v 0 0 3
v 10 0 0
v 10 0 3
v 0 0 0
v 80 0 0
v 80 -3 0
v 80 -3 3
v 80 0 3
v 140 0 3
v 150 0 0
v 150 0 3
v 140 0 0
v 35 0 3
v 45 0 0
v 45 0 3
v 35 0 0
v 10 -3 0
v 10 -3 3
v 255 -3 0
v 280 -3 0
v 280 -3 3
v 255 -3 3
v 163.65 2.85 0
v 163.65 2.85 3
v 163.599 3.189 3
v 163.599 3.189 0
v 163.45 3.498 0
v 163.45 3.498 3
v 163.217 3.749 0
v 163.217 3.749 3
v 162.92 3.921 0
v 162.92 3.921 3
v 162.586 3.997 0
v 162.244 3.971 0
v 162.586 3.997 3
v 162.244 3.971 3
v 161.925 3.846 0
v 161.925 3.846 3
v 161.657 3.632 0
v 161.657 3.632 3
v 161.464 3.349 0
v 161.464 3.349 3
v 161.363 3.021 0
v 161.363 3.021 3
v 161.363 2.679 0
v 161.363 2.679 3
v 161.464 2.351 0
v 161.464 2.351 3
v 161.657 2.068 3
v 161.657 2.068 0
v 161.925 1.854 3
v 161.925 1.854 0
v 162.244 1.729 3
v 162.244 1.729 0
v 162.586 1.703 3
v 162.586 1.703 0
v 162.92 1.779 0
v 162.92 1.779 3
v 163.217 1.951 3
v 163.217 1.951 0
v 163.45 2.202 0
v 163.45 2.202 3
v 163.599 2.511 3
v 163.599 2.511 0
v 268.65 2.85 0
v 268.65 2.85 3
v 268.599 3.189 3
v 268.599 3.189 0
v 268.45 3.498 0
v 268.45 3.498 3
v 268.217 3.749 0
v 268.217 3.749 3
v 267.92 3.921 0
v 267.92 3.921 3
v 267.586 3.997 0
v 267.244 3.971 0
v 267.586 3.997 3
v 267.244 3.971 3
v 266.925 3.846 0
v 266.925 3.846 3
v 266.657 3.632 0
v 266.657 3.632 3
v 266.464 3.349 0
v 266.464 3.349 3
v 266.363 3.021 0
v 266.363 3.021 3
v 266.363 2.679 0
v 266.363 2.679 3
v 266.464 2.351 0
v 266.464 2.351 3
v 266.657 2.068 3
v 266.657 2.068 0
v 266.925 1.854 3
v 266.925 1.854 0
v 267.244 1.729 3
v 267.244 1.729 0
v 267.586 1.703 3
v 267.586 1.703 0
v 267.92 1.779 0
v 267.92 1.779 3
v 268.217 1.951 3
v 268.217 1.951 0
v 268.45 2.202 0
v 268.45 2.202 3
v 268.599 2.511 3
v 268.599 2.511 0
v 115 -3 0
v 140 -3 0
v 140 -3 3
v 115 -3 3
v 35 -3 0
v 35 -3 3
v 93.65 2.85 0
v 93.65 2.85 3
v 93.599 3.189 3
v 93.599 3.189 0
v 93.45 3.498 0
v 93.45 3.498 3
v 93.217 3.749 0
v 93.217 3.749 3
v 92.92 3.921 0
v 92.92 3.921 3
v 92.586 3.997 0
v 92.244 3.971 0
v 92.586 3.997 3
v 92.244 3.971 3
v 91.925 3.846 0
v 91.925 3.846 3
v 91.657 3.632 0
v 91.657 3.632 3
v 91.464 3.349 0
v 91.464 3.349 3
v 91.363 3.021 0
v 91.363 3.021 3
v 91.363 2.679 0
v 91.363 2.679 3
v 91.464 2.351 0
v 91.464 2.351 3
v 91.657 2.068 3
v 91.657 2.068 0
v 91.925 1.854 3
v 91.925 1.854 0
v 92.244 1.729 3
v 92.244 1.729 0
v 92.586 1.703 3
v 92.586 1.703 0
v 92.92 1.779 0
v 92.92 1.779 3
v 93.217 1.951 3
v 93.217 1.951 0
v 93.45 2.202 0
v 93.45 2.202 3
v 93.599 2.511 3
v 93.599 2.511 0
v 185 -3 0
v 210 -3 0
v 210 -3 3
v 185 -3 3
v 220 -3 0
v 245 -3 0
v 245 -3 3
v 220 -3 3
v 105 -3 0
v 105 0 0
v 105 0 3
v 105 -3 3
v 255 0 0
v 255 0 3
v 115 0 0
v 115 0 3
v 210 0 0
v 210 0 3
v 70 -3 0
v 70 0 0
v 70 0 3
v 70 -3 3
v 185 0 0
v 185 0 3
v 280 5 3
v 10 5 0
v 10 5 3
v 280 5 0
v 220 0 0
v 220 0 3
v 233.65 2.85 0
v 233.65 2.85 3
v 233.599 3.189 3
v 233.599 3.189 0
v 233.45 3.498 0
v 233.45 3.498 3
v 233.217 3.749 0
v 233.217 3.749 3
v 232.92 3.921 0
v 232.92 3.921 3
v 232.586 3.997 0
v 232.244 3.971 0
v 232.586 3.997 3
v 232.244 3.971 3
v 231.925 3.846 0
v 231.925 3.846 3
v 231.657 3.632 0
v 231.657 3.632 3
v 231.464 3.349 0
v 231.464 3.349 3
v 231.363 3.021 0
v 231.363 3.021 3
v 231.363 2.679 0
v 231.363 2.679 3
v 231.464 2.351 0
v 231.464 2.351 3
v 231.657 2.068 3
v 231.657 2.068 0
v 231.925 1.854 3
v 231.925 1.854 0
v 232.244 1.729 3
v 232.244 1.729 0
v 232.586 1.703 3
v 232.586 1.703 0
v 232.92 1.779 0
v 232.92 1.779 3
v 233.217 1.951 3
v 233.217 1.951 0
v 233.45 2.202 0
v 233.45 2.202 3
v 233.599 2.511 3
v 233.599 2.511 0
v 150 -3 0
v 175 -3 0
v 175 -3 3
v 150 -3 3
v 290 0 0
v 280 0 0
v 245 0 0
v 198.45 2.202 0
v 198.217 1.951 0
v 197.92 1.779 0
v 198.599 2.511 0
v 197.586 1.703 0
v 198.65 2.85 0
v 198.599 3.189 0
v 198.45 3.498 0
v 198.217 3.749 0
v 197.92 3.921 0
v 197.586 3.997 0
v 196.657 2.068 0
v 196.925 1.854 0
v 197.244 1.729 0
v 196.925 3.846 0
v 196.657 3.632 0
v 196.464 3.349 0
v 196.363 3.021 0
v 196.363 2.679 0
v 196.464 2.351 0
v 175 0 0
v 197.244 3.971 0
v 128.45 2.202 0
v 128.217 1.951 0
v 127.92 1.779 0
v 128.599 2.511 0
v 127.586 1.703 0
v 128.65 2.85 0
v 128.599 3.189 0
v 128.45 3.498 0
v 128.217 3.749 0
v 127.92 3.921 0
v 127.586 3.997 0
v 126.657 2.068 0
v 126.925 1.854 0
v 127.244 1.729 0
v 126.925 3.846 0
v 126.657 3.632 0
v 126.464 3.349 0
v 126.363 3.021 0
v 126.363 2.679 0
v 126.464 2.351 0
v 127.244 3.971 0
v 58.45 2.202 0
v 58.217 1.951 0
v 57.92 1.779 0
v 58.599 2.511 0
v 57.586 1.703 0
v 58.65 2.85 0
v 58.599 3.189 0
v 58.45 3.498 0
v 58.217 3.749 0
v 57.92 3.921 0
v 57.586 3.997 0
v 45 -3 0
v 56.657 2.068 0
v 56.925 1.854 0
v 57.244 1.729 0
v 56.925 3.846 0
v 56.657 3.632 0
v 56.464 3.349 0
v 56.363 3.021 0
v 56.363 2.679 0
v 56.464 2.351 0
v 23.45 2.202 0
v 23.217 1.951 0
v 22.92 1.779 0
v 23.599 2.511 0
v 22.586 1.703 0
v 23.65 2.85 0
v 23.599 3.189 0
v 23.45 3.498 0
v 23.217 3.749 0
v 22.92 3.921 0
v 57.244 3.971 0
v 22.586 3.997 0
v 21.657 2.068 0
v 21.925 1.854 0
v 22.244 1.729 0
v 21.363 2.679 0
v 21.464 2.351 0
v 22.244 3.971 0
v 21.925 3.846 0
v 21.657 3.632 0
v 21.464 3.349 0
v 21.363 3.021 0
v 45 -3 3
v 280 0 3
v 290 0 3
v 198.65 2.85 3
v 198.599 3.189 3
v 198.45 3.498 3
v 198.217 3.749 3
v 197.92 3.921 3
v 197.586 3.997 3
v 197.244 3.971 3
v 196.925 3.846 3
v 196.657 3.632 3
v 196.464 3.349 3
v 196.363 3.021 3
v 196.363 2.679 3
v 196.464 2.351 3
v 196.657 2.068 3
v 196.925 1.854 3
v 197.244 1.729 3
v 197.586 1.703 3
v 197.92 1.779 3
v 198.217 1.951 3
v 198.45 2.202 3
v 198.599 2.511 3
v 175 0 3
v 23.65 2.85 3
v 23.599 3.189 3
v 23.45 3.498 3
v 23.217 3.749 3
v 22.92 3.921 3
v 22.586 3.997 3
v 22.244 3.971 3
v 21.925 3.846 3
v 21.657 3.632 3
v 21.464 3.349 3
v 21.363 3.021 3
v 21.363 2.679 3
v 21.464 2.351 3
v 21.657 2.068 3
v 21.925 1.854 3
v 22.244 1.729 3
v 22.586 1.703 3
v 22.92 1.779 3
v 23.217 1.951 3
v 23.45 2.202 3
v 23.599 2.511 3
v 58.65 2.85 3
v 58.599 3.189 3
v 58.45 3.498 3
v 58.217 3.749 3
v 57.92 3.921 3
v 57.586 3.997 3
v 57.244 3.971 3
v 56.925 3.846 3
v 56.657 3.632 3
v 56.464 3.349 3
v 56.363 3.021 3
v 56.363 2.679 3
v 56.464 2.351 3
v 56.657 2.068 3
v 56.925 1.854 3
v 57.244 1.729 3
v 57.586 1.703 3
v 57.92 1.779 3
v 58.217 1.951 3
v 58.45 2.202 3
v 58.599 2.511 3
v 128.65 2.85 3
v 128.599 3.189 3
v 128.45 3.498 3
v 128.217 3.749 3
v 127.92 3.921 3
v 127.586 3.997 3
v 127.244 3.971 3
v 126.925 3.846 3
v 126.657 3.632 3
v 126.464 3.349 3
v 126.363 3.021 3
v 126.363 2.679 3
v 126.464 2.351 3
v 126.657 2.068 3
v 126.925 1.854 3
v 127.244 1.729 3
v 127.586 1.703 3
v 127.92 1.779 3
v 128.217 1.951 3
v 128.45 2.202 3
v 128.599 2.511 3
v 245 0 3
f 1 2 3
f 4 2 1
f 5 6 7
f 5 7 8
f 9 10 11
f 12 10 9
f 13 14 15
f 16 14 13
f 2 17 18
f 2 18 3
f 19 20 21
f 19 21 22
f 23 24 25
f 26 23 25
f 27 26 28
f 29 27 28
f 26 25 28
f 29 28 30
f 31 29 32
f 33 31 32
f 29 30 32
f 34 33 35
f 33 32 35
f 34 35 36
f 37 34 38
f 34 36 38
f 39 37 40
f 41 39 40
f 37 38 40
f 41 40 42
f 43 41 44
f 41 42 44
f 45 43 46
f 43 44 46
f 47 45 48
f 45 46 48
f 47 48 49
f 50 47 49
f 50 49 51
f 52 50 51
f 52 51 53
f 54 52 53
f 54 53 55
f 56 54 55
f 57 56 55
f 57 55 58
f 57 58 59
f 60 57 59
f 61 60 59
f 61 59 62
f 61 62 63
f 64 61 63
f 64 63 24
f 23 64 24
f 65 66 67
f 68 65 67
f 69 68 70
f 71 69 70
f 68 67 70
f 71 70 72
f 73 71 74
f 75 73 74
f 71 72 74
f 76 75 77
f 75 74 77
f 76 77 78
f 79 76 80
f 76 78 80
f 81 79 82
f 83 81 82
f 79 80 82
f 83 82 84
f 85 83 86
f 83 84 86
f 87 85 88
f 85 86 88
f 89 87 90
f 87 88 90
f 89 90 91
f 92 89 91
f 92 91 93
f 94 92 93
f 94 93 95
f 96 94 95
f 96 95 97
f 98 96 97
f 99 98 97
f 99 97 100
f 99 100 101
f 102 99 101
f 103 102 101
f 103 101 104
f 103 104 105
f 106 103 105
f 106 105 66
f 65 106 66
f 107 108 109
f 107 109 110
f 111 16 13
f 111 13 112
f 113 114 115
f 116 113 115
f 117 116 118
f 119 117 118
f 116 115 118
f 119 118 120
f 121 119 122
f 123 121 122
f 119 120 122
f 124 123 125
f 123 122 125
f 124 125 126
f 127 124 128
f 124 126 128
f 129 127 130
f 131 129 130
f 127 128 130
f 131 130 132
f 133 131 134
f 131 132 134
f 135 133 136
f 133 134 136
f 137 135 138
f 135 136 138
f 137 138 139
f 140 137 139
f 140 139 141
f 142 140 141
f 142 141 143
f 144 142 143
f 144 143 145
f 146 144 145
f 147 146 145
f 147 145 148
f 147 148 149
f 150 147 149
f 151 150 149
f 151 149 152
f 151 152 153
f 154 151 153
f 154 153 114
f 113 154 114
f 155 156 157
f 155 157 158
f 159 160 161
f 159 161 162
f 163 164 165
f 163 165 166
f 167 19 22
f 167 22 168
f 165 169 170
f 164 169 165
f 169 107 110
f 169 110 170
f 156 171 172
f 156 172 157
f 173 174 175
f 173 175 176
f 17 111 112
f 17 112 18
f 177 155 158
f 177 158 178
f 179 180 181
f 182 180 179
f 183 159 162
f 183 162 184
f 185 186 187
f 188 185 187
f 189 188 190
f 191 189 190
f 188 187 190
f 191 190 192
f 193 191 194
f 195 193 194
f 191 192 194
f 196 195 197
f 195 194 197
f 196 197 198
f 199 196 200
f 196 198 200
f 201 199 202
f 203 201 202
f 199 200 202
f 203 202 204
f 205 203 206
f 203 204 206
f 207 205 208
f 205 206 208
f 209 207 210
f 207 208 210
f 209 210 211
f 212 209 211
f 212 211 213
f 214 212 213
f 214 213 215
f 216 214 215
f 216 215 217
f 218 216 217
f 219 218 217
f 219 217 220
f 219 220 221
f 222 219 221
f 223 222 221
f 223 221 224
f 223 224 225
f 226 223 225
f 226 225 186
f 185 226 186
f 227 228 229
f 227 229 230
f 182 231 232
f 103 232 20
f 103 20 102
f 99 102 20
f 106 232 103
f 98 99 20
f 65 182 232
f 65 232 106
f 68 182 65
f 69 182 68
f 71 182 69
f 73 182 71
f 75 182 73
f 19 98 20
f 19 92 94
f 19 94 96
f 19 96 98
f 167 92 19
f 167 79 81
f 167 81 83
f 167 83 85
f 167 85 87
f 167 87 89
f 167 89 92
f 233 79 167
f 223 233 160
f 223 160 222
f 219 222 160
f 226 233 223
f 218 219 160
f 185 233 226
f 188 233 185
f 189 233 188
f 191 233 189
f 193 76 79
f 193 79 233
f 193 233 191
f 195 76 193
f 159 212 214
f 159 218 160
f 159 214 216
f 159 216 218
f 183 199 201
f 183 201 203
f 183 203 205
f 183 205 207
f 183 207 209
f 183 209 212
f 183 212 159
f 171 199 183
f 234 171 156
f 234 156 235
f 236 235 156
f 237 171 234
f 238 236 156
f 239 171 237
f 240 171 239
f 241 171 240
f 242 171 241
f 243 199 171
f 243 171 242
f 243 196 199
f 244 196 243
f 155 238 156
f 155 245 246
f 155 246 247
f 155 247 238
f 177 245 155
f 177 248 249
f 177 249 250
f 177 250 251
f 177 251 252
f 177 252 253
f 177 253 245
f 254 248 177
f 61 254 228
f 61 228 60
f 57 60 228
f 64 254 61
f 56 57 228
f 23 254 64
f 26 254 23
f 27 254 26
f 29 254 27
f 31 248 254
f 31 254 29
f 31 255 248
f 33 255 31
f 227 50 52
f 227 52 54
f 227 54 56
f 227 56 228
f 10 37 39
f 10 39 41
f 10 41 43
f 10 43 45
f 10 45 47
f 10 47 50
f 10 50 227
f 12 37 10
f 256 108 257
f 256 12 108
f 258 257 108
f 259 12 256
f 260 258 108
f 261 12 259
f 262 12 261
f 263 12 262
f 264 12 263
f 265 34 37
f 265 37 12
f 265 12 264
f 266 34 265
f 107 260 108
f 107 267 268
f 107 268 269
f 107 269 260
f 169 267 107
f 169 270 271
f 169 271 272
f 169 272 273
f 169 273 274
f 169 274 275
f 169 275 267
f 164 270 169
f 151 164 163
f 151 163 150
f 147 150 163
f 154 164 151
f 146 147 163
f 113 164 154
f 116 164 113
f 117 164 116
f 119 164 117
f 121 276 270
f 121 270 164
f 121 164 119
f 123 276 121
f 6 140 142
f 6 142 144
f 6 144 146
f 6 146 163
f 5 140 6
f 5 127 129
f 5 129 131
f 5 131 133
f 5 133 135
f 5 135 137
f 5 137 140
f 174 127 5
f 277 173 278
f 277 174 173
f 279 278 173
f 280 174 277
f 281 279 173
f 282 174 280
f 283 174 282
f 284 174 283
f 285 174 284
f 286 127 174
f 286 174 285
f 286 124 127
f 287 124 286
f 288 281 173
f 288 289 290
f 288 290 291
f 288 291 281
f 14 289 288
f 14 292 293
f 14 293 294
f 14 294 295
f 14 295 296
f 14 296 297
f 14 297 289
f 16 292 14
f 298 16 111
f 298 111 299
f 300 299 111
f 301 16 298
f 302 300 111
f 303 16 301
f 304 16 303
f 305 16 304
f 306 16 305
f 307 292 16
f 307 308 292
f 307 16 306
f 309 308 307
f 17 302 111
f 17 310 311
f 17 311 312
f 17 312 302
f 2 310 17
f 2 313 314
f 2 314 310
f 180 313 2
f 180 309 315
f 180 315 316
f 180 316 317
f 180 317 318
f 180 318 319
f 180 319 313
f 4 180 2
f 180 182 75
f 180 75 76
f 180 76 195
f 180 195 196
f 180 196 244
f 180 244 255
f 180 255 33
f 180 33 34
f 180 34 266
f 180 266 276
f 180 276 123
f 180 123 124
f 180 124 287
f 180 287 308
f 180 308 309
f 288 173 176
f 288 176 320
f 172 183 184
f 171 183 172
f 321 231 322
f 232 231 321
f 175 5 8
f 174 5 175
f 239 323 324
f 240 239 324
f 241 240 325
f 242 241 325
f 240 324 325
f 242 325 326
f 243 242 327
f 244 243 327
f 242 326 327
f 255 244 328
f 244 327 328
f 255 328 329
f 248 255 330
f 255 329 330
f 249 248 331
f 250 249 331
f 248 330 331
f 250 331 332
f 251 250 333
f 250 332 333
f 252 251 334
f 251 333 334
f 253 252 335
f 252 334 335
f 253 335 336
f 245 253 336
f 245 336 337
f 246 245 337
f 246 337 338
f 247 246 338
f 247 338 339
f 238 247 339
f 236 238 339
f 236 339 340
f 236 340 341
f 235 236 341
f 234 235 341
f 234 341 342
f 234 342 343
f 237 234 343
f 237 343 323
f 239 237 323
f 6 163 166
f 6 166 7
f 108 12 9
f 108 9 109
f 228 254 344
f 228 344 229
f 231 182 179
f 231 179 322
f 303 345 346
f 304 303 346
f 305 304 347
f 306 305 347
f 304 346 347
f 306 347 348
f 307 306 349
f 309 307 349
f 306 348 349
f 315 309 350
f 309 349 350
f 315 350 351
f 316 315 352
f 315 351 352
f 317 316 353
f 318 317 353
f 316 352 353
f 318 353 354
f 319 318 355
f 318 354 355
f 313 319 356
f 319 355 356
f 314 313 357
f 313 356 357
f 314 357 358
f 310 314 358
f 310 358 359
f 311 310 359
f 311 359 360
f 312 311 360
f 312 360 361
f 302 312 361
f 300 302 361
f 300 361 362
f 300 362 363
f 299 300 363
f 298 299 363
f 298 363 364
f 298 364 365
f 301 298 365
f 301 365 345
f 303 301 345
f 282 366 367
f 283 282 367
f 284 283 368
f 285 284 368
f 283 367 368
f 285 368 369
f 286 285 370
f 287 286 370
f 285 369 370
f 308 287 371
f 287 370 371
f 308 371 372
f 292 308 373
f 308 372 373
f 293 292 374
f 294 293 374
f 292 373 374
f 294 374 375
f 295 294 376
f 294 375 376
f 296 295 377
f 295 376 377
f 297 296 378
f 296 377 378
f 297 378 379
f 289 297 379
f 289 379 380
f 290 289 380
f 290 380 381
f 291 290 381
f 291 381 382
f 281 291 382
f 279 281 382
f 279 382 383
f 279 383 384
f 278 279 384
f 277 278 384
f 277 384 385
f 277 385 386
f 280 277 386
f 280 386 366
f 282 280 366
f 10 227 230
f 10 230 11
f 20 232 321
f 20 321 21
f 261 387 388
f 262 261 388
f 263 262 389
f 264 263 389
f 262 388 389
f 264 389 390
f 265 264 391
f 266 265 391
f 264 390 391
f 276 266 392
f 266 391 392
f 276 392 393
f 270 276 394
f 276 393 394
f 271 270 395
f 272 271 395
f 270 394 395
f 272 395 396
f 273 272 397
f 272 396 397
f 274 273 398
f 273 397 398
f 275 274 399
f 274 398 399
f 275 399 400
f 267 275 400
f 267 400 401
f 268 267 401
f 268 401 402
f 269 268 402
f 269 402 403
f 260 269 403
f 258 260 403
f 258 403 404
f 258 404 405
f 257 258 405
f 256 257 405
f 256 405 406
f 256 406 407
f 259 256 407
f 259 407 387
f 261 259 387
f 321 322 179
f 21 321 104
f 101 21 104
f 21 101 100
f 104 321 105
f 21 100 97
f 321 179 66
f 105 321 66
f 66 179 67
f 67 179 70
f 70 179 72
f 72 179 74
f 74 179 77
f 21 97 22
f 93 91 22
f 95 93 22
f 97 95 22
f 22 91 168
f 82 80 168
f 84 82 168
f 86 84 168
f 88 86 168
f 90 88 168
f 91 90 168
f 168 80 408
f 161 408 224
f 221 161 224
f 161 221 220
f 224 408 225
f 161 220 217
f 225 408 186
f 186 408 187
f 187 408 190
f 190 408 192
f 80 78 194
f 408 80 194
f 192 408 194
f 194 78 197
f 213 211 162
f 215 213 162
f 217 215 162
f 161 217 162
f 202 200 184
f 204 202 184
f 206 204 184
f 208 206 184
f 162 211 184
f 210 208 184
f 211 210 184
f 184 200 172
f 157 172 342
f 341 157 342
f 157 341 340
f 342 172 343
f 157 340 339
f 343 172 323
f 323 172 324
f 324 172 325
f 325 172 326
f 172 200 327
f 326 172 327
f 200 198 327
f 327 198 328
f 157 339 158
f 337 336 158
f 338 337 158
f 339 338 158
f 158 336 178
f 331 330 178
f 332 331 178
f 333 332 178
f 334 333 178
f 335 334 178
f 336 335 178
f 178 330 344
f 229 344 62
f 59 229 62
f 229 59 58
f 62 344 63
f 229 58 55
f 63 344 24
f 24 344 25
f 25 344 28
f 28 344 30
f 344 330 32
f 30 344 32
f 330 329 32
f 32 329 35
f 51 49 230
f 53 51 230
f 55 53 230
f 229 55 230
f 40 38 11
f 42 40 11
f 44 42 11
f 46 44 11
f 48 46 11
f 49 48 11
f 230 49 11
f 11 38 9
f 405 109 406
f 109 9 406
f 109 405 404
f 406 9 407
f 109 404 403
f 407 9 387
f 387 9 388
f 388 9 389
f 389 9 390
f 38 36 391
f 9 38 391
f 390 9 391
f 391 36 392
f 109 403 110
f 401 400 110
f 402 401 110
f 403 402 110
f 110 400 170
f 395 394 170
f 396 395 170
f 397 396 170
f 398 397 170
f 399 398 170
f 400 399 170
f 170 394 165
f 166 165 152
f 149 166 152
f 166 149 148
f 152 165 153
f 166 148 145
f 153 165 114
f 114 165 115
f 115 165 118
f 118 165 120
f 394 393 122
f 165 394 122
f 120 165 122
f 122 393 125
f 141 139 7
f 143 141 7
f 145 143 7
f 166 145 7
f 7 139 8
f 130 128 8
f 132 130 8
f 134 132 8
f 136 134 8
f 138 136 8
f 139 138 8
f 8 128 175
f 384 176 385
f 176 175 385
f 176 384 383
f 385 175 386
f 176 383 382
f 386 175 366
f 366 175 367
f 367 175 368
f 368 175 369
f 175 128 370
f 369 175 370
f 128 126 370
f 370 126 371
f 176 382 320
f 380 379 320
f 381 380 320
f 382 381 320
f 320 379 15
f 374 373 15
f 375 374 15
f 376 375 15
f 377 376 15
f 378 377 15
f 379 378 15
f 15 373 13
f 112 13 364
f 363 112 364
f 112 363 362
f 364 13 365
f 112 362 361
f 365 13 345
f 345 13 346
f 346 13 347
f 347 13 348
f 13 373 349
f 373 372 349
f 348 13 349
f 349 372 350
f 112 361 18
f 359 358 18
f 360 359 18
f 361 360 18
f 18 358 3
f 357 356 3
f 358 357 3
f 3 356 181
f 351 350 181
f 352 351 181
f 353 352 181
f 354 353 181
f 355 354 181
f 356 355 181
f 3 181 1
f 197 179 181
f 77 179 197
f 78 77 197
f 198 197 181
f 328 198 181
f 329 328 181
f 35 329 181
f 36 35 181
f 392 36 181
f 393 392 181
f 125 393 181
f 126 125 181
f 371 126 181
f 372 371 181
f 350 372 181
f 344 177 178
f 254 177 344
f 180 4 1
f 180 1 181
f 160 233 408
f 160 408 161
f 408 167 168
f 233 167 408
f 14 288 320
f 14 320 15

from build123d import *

# Parameters (mm, degrees)
EXTRUDE_1_DEPTH     = 3
SKETCH_2_R          = 1.15
CUT_EXTRUDE_1_DEPTH = 291.058614766


with BuildPart() as part:
    # 草图1 → 凸台-拉伸1 (new body)
    with BuildSketch(Plane.XY):
        Polygon((0, 0), (10, 5), (280, 5), (290, 0), (280, 0), (280, -3), (255, -3), (255, 0), (245, 0), (245, -3), (220, -3), (220, 0), (210, 0), (210, -3), (185, -3), (185, 0), (175, 0), (175, -3), (150, -3), (150, 0), (140, 0), (140, -3), (115, -3), (115, 0), (105, 0), (105, -3), (80, -3), (80, 0), (70, 0), (70, -3), (45, -3), (45, 0), (35, 0), (35, -3), (10, -3), (10, 0), align=None)
    extrude(amount=EXTRUDE_1_DEPTH)

    # 草图2 → 切除-拉伸1 (cut, through all)
    with BuildSketch(Plane.XY.offset(3)):
        with Locations((22.5, 2.85)):
            Circle(SKETCH_2_R)
        with Locations((57.5, 2.85)):
            Circle(SKETCH_2_R)
        with Locations((92.5, 2.85)):
            Circle(SKETCH_2_R)
        with Locations((127.5, 2.85)):
            Circle(SKETCH_2_R)
        with Locations((162.5, 2.85)):
            Circle(SKETCH_2_R)
        with Locations((197.5, 2.85)):
            Circle(SKETCH_2_R)
        with Locations((232.5, 2.85)):
            Circle(SKETCH_2_R)
        with Locations((267.5, 2.85)):
            Circle(SKETCH_2_R)
    extrude(amount=-CUT_EXTRUDE_1_DEPTH, mode=Mode.SUBTRACT)


solid = part.part
